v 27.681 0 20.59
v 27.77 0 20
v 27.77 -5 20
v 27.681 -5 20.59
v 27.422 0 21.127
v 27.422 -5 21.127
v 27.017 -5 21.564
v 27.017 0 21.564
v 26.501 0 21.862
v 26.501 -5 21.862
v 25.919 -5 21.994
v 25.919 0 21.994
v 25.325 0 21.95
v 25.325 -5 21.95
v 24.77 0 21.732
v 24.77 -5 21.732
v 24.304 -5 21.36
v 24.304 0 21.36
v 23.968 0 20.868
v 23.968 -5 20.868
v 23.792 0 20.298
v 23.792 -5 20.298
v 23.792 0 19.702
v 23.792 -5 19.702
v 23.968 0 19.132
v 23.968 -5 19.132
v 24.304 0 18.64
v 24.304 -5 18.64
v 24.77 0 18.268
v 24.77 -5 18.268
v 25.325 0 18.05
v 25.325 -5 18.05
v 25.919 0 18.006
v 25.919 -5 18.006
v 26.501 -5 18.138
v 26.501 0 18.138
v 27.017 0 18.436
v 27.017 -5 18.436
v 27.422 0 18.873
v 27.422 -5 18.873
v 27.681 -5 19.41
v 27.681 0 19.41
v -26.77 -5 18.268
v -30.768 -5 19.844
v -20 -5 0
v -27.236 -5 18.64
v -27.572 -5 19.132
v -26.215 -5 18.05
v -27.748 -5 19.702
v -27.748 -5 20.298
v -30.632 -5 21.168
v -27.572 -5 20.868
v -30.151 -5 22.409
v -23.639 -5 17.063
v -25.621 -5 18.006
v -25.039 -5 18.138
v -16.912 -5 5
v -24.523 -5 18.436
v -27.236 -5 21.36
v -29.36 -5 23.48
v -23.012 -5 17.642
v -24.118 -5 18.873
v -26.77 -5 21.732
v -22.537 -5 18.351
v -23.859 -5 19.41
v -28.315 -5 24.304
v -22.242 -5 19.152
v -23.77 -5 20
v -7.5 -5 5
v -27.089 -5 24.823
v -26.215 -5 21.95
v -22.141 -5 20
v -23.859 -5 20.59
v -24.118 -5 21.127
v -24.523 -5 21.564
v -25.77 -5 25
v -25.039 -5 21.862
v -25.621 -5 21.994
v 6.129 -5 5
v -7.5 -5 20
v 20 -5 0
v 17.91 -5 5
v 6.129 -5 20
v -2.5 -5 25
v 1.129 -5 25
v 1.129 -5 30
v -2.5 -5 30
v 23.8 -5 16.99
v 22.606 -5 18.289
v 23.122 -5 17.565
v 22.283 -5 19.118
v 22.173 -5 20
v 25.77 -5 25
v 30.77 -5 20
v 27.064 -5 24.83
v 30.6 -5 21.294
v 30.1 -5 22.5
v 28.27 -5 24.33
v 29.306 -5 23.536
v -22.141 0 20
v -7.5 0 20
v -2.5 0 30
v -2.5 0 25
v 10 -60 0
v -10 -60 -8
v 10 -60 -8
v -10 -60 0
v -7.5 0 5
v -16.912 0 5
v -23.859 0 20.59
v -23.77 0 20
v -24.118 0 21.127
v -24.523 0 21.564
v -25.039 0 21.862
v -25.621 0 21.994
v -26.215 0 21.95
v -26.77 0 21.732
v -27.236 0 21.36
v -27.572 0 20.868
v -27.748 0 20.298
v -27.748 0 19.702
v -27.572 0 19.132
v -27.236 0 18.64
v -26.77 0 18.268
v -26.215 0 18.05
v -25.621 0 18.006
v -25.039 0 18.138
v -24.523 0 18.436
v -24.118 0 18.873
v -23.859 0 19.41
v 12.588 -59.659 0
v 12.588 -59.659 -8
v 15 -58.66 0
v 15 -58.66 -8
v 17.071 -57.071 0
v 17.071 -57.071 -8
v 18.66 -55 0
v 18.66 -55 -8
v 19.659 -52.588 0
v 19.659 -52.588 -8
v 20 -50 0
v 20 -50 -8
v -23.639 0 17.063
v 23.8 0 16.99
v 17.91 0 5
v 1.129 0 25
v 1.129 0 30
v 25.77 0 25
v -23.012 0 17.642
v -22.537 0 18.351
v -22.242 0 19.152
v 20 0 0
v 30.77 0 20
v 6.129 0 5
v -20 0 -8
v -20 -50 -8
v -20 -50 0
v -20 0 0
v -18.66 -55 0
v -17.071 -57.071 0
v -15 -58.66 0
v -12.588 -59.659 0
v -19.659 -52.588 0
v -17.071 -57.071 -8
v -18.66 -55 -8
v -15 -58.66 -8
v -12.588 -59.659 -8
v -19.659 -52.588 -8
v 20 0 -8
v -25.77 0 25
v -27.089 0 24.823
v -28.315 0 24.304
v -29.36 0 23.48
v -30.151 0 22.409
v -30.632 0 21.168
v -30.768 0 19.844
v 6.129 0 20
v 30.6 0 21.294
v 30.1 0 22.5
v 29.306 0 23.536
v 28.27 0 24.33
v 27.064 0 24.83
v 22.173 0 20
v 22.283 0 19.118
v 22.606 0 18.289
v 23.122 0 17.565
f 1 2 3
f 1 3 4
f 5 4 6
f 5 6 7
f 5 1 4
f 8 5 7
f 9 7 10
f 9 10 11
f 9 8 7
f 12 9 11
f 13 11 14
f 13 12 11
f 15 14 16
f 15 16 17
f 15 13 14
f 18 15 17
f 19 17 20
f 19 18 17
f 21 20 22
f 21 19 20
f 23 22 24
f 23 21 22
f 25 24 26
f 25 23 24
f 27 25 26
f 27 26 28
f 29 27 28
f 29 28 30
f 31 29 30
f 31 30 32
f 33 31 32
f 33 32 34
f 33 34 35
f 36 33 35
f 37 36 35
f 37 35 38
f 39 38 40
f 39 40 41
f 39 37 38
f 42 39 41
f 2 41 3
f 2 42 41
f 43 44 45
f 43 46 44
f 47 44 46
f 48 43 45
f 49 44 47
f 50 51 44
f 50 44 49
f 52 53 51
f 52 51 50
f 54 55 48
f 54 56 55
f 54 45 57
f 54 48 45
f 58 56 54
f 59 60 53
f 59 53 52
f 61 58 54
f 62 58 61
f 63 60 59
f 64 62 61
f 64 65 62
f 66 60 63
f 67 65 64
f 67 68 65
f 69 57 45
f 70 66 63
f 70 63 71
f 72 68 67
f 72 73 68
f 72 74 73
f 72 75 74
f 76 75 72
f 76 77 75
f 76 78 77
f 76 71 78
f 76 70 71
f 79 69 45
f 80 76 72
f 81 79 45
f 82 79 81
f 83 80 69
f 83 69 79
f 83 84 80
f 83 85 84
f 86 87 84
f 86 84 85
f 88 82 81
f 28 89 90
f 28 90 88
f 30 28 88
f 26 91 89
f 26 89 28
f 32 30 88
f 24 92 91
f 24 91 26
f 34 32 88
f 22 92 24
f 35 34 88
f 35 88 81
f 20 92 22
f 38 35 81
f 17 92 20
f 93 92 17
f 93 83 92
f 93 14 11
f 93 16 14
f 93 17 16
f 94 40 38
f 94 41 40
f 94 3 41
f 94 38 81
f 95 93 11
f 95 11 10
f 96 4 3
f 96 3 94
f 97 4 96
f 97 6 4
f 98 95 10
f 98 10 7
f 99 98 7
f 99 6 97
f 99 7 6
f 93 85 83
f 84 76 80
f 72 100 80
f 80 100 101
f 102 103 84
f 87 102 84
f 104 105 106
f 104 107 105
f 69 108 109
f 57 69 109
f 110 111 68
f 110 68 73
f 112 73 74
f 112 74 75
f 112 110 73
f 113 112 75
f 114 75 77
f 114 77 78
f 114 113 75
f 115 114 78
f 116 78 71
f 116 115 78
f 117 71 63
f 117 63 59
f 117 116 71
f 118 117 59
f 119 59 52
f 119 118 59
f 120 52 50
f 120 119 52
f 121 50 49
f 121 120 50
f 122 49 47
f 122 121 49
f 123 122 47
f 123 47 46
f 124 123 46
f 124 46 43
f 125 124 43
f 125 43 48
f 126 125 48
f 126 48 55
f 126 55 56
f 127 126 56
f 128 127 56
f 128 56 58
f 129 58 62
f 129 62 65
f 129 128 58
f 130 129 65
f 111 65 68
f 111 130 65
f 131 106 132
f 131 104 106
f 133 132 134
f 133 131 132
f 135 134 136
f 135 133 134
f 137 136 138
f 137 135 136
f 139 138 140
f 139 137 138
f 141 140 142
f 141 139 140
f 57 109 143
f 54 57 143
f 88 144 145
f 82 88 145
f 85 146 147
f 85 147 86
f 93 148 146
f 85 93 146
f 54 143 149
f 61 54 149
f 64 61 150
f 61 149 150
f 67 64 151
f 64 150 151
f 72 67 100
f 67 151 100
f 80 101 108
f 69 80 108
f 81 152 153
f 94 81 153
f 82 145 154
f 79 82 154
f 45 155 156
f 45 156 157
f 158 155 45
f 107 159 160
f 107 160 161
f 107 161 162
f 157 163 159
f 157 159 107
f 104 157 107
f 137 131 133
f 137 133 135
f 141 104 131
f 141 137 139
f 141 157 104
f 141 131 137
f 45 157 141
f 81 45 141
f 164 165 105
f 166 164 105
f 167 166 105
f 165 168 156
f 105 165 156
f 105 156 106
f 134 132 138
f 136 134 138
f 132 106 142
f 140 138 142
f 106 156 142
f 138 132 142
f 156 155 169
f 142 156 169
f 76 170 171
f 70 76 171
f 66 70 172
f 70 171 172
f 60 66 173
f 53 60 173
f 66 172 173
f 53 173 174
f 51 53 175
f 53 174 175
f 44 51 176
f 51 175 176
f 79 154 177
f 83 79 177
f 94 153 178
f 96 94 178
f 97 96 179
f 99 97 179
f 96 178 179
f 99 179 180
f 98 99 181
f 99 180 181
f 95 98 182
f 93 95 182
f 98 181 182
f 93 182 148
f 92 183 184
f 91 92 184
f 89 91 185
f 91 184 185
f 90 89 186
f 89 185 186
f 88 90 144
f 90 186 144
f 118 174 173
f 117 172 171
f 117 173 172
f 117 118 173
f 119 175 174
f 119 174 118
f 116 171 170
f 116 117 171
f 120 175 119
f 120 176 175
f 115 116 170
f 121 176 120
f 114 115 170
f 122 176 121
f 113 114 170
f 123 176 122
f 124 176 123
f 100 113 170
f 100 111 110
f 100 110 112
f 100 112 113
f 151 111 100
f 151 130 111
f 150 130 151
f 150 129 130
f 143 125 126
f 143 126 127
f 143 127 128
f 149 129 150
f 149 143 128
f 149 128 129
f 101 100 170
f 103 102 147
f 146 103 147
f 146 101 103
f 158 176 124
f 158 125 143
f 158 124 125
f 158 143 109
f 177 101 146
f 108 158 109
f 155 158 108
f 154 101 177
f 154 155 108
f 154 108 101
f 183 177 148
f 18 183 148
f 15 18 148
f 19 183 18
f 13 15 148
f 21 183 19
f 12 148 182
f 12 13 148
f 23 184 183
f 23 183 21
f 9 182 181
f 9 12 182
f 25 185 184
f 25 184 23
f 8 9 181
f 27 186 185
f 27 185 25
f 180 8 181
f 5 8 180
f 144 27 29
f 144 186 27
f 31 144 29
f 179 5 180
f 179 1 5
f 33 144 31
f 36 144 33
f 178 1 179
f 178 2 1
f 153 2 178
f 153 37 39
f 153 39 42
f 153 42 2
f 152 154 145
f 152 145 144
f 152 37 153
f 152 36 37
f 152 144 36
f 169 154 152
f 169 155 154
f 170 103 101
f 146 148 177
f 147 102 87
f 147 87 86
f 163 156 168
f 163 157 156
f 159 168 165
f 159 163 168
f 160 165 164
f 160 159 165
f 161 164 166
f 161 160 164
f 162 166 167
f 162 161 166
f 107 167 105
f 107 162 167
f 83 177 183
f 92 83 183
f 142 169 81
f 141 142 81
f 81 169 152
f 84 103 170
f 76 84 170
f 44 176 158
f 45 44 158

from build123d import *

# Parameters (mm, degrees)
F0_W      = 40
F0_H      = 8
F1_DEPTH  = 60
F0_W_2    = 3.6288669872
F0_H_2    = 15
F0_R      = 2
F1_FACE_W = 40
F1_FACE_H = 8
F2_DEPTH  = 5
F3_R      = 10
F4_R      = 10
F5_DEPTH  = 25


with BuildPart() as f1:
    # F0 (on Front) → F1 (new body)
    with BuildSketch(Plane.XZ):
        with Locations((0, -4)):
            Rectangle(F0_W, F0_H)
    extrude(amount=F1_DEPTH)

    # F0 (on Front) + F1_face (on face) → F2 (join)
    with BuildSketch(Plane.XZ):
        with Locations((0, -4)):
            Rectangle(F0_W, F0_H)
        with BuildLine():
            Line((-30.7675590175, 19.8437826291), (-20, 0))
            Line((-20, 0), (20, 0))
            Line((20, 0), (30.77, 20))
            ThreePointArc((30.77, 20), (29.3055339059, 23.5355339059), (25.77, 25))
            Line((25.77, 25), (-25.77, 25))
            ThreePointArc((-25.77, 25), (-29.3603402941, 23.4798644475), (-30.7675590175, 19.8437826291))
        make_face()
        with BuildLine():
            ThreePointArc((-23.6389977535, 17.0627385142), (-22.5372148762, 18.3514321505), (-22.1411330128, 20))
            Line((-22.1411330128, 20), (-7.5, 20))
            Line((-7.5, 20), (-7.5, 5))
            Line((-7.5, 5), (-16.9122926891, 5))
            Line((-16.9122926891, 5), (-23.6389977535, 17.0627385142))
        make_face(mode=Mode.SUBTRACT)
        with Locations((-0.6855665064, 12.5)):
            Rectangle(F0_W_2, F0_H_2, mode=Mode.SUBTRACT)
        with Locations((-25.77, 20)):
            Circle(F0_R, mode=Mode.SUBTRACT)
        with BuildLine():
            Line((6.1288669872, 5), (6.1288669872, 20))
            Line((6.1288669872, 20), (22.1729351457, 20))
            ThreePointArc((22.1729351457, 20), (22.6057679037, 18.2892952308), (23.8001011411, 16.9902867159))
            Line((23.8001011411, 16.9902867159), (17.9096478969, 5))
            Line((17.9096478969, 5), (6.1288669872, 5))
        make_face(mode=Mode.SUBTRACT)
        with Locations((25.77, 20)):
            Circle(F0_R, mode=Mode.SUBTRACT)
    with BuildSketch(Plane(origin=(0, 0, -4), x_dir=(1, 0, 0), z_dir=(0, 1, 0))):
        Rectangle(F1_FACE_W, F1_FACE_H)
    extrude(amount=F2_DEPTH, dir=(0, -1, 0))

    # F3
    f3_edges = [f1.edges().sort_by_distance(p)[0] for p in [
        (-20, -60, -4),
    ]]
    fillet(f3_edges, radius=F3_R)

    # F4
    f4_edges = [f1.edges().sort_by_distance(p)[0] for p in [
        (20, -60, -4),
    ]]
    fillet(f4_edges, radius=F4_R)

    # F5 (add): a face of the model
    f5_faces = [f1.faces().sort_by_distance(p)[0] for p in [
        (-0.6855665064, -2.5, 5),
    ]]
    extrude(f5_faces, amount=F5_DEPTH)


solid = f1.part
